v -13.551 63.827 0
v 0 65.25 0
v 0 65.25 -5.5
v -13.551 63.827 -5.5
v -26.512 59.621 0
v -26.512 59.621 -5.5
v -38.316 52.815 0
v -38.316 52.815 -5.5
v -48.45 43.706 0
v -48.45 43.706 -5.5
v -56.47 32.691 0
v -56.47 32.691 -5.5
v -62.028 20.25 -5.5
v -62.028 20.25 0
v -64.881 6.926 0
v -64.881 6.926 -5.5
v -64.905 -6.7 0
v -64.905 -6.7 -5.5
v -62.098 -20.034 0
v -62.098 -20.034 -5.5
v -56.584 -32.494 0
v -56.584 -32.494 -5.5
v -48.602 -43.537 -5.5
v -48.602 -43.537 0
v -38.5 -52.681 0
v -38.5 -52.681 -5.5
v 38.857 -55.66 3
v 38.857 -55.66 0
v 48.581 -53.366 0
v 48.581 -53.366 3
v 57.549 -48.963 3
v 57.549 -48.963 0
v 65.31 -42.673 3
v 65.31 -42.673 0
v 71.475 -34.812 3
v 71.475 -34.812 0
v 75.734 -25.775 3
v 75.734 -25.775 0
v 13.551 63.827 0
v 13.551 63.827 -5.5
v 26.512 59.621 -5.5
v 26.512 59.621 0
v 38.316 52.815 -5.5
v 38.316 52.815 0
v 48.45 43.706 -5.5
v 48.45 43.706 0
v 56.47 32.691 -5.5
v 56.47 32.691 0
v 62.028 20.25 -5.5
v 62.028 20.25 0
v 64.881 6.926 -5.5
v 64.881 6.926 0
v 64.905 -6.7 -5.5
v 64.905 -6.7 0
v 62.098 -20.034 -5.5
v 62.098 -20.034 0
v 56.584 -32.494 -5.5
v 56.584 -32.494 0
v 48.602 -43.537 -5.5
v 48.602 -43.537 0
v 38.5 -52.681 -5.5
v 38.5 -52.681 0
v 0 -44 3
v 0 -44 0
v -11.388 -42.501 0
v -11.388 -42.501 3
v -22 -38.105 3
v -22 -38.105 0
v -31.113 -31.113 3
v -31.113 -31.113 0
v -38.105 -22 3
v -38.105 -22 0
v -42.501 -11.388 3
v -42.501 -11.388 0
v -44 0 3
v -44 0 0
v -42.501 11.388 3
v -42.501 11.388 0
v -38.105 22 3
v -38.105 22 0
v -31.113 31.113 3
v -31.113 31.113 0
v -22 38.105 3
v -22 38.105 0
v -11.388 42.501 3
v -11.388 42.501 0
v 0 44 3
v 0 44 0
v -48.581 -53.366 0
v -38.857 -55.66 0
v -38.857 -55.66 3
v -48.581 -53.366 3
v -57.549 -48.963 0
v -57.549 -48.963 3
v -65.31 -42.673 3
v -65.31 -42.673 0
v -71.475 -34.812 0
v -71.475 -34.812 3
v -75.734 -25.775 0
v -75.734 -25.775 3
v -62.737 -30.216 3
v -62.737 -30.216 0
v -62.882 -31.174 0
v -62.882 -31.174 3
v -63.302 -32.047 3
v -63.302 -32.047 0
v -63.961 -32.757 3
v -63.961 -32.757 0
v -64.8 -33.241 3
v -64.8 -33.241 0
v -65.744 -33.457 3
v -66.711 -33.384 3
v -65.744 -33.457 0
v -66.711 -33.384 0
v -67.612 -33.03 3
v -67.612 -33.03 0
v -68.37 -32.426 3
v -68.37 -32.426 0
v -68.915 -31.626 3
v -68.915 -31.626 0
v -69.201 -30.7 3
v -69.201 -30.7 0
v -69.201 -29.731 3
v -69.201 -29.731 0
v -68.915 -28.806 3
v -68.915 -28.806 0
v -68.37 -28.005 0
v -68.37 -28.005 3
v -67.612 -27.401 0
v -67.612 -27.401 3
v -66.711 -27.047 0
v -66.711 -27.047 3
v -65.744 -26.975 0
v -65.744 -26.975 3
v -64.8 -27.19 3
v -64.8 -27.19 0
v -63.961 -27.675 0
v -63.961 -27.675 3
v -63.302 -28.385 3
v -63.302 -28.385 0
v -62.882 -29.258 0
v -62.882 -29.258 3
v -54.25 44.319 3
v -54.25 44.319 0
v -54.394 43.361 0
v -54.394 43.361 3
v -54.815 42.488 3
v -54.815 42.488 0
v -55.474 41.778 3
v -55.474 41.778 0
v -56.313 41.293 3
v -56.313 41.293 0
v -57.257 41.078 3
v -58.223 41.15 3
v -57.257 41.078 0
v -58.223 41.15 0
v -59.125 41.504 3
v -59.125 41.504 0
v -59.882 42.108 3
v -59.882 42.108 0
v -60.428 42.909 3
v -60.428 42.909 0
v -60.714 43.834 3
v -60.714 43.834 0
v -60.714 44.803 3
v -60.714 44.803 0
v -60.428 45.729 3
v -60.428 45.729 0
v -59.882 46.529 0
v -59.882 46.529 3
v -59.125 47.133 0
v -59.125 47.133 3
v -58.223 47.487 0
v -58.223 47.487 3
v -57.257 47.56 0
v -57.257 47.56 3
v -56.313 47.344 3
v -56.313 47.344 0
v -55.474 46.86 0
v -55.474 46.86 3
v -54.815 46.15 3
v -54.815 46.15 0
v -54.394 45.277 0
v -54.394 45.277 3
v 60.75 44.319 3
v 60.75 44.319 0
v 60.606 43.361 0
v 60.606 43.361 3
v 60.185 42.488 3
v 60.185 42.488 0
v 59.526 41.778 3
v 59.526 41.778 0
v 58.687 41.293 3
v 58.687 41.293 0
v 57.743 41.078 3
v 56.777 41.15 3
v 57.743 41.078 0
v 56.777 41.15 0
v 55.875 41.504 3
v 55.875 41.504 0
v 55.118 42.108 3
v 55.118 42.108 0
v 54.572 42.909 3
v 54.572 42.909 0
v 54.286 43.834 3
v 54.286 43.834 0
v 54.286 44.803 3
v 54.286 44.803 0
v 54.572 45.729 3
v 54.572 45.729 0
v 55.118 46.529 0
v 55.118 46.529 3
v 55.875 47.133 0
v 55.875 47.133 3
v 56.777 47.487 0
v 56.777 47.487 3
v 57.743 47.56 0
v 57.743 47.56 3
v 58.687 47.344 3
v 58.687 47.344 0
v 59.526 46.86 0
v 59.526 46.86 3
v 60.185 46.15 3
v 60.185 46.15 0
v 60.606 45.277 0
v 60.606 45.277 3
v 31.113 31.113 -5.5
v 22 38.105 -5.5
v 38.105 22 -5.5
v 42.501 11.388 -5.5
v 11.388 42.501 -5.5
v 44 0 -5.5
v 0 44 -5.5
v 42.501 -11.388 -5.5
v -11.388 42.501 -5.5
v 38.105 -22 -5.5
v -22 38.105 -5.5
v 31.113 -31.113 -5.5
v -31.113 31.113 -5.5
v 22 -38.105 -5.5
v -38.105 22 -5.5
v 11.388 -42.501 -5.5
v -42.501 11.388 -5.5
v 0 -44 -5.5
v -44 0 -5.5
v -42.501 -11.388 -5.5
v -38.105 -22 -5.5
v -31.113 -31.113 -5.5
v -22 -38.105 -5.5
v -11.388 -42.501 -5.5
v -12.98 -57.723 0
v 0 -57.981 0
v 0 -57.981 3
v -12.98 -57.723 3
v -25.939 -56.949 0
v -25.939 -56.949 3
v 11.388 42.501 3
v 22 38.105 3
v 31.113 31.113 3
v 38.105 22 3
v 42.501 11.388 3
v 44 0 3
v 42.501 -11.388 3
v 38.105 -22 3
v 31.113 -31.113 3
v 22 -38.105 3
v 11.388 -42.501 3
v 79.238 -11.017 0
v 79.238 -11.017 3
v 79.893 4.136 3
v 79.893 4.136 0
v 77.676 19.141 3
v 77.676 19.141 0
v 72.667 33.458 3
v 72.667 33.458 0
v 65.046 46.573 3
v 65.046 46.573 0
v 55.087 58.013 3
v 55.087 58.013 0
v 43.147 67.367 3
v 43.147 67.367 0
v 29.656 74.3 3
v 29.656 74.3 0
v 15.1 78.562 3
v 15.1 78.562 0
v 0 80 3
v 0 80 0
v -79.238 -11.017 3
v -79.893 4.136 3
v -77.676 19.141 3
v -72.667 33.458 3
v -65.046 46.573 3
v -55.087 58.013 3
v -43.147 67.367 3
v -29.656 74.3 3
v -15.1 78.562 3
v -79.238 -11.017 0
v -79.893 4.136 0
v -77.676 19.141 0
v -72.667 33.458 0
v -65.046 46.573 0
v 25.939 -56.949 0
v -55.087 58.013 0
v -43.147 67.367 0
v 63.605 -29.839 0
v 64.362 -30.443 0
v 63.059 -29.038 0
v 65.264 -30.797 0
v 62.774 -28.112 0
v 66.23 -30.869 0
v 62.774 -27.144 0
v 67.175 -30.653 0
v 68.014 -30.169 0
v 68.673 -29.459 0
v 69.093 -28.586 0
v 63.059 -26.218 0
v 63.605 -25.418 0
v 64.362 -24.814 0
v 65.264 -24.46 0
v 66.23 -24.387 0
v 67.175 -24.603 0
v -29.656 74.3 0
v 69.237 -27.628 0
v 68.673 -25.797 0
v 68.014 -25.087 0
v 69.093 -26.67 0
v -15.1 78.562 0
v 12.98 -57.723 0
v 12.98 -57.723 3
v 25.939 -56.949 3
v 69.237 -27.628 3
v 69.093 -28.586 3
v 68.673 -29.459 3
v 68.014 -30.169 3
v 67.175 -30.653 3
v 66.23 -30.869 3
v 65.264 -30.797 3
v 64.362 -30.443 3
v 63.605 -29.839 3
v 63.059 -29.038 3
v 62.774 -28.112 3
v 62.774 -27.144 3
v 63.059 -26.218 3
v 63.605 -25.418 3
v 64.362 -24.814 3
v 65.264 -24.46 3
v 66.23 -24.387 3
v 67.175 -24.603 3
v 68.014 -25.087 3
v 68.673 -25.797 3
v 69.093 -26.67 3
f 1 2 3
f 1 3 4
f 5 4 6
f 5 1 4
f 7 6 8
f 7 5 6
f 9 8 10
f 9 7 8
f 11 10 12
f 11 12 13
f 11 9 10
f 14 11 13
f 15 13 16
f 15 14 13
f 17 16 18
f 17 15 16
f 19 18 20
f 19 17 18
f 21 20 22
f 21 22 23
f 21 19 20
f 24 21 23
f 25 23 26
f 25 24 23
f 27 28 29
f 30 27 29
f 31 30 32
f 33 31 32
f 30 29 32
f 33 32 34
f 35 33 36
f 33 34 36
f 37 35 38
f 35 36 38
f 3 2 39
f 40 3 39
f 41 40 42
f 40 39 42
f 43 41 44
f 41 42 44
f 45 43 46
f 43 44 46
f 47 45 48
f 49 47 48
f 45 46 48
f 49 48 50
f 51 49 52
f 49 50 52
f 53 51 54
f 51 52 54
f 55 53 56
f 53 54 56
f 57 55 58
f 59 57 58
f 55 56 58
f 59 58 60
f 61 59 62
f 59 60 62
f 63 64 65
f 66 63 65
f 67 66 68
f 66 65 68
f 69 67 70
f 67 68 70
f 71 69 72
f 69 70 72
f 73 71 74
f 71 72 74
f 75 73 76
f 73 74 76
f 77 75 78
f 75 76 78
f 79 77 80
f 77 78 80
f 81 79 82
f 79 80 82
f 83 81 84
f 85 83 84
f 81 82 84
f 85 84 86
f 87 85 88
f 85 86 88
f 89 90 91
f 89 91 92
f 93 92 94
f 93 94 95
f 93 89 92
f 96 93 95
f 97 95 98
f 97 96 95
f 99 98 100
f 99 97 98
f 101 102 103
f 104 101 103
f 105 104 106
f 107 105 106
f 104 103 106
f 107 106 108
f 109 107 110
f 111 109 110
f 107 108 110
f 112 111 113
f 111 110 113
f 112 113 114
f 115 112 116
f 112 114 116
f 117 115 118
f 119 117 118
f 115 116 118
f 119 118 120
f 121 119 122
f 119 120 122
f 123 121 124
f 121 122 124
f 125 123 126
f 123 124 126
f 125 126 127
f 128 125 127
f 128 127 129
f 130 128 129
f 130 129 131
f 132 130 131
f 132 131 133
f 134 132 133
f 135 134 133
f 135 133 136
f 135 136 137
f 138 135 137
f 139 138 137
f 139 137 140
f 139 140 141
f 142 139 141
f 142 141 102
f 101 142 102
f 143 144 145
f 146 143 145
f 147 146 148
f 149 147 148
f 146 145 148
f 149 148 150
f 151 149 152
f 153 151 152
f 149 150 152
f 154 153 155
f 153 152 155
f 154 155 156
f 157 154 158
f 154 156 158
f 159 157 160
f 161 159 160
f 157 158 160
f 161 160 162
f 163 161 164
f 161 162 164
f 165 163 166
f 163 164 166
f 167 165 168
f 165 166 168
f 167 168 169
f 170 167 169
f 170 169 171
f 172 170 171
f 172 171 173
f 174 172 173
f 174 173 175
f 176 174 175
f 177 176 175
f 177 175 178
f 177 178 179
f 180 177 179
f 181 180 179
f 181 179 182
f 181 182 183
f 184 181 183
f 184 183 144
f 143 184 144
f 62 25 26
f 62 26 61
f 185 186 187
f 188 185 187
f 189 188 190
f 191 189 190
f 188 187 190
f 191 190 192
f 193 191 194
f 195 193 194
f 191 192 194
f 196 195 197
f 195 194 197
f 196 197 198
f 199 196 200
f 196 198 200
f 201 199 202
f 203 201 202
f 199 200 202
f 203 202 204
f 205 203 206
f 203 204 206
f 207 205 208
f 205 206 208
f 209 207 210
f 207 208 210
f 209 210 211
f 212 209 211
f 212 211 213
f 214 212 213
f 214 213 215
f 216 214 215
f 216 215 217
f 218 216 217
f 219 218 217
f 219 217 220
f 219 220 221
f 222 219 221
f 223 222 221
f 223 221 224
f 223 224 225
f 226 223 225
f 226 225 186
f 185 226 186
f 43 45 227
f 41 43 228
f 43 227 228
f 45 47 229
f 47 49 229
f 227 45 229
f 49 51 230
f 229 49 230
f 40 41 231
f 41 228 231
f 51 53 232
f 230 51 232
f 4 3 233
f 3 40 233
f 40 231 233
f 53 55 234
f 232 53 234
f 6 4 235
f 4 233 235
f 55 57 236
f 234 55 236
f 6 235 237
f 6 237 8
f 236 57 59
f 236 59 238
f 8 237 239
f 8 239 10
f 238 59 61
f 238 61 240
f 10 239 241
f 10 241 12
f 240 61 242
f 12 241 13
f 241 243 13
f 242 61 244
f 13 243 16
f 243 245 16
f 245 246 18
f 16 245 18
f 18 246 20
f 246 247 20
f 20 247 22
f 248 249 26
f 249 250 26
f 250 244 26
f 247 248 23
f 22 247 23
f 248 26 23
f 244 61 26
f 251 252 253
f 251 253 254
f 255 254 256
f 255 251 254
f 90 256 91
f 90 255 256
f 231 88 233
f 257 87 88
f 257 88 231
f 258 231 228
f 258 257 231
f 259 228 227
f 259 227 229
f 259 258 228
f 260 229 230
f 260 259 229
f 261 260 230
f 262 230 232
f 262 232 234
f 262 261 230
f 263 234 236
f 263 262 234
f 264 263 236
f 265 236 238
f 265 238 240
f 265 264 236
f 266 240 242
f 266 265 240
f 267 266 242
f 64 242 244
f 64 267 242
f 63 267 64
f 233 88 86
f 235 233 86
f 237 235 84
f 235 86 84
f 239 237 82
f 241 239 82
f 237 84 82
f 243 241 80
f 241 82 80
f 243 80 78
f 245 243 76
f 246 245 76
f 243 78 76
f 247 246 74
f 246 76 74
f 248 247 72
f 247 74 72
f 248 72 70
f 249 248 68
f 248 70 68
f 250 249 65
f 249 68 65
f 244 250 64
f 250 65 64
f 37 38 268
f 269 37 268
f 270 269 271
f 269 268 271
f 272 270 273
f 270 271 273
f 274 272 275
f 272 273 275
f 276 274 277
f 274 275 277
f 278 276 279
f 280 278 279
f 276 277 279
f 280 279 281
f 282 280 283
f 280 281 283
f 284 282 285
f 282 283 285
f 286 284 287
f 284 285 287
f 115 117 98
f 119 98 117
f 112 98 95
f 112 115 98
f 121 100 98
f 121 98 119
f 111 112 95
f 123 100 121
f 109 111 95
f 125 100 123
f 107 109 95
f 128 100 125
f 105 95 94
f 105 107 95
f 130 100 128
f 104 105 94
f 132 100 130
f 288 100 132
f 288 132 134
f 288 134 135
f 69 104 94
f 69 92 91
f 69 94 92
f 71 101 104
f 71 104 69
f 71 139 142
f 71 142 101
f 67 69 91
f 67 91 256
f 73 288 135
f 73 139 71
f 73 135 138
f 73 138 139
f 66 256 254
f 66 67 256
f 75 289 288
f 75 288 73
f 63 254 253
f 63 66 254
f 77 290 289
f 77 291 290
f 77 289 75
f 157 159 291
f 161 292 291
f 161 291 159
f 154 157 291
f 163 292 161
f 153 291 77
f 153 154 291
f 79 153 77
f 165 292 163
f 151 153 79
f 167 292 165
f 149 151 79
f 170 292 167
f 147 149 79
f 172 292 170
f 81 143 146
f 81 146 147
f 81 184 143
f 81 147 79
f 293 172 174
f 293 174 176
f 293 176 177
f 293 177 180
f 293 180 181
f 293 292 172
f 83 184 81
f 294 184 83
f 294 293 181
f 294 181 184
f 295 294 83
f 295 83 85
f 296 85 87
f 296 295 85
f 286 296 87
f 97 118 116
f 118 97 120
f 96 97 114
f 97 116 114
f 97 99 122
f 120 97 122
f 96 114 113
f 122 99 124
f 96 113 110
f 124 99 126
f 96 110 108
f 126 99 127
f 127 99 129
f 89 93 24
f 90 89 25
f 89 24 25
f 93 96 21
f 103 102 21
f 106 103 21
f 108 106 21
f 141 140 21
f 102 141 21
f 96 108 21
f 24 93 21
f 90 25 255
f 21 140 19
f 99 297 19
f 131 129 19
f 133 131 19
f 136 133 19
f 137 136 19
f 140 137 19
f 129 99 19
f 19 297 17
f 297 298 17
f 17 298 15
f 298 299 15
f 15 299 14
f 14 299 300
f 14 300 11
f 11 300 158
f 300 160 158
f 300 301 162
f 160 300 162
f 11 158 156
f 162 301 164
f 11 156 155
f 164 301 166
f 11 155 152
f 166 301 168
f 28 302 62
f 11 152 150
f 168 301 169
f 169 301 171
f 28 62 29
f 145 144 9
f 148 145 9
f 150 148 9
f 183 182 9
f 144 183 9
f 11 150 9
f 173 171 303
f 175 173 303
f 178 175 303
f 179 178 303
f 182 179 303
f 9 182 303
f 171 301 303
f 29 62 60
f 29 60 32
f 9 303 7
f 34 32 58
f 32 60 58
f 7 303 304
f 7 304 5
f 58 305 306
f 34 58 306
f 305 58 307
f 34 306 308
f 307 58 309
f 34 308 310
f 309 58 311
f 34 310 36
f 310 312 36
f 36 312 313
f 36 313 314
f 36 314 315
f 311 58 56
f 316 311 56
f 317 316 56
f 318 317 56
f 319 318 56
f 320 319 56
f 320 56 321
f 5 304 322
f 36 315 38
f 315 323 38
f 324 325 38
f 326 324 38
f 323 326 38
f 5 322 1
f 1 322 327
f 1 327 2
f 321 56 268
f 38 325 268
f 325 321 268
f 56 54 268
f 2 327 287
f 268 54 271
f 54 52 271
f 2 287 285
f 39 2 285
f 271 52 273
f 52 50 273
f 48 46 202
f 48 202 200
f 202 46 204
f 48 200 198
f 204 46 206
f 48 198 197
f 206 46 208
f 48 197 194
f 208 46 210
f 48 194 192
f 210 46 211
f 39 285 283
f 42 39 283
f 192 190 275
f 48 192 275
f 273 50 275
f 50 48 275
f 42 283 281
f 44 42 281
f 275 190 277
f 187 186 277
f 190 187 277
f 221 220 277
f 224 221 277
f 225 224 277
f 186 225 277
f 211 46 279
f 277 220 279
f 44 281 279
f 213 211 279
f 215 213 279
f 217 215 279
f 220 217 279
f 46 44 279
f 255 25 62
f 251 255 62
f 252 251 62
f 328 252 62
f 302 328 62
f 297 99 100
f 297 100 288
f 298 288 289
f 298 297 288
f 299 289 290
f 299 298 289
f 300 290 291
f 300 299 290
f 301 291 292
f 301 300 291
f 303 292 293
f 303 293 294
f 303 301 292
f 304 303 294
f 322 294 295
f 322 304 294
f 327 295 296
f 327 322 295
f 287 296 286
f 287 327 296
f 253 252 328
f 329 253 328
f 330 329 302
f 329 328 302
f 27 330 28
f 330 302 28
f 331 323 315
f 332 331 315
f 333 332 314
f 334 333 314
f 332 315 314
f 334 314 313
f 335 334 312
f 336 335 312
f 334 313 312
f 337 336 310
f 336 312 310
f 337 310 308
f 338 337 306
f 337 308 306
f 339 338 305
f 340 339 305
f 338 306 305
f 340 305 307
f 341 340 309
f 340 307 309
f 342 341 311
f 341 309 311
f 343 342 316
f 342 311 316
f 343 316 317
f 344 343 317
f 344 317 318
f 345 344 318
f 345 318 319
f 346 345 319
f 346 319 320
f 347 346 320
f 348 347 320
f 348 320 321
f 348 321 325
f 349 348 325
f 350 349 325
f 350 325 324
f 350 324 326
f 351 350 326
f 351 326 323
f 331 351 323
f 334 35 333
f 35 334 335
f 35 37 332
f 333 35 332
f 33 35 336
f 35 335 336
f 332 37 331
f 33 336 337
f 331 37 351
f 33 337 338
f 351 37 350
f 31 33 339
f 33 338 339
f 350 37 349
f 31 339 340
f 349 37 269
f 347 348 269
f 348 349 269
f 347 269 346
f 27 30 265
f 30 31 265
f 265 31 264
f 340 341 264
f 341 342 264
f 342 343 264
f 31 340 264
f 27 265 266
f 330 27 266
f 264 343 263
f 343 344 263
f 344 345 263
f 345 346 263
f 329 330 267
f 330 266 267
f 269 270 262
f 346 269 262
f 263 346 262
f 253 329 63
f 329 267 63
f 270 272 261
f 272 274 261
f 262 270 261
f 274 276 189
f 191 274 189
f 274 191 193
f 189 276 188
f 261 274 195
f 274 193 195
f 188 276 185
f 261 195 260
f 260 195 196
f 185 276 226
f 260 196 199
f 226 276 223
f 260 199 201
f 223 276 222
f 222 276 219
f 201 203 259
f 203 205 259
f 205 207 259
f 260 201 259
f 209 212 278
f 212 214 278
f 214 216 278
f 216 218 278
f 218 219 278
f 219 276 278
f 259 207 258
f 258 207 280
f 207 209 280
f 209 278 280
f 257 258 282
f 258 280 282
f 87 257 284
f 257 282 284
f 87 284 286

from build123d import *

# Parameters (mm, degrees)
PAD_DEPTH    = 3
PAD001_DEPTH = 5.5
SKETCH002_R  = 3.25
POCKET_DEPTH = 5


with BuildPart() as part:
    # Sketch → Pad (new body)
    with BuildSketch(Plane.XY):
        with BuildLine():
            ThreePointArc((0, -44), (44, 0), (0, 44))
            Line((0, 80), (0, 44))
            ThreePointArc((75.734063, -25.775021), (65.046144, 46.572515), (0, 80))
            ThreePointArc((38.857167, -55.659898), (61.606206, -46.036578), (75.734063, -25.775021))
            ThreePointArc((0, -57.981235), (19.463222, -57.400384), (38.857167, -55.659898))
            Line((0, -57.981235), (0, -44))
        make_face()
    pad = extrude(amount=PAD_DEPTH)

    # Sketch001 (on Face7 of Pad) → Pad001 (join)
    with BuildSketch(Plane(origin=(0, 0, 0), x_dir=(1, 0, 0), z_dir=(0, 0, -1))):
        with BuildLine():
            ThreePointArc((0, -65.25), (62.028272, -20.249839), (38.5, 52.681235))
            Line((38.5, 52.681235), (0, 52.681235))
            Line((0, 44), (0, 52.681235))
            ThreePointArc((0, -44), (44, 0), (0, 44))
            Line((0, -44), (0, -65.25))
        make_face()
    pad001 = extrude(amount=PAD001_DEPTH)

    # Mirrored: Pad, Pad001 across Sketch V_Axis
    add(pad.mirror(Plane(origin=(0, 0, 0), x_dir=(0, 0, 1), z_dir=(1, 0, 0))))
    add(pad001.mirror(Plane(origin=(0, 0, 0), x_dir=(0, 0, 1), z_dir=(1, 0, 0))))

    # Sketch002 (on Face4 of Mirrored) → Pocket (cut)
    with BuildSketch(Plane(origin=(0, 0, 0), x_dir=(1, 0, 0), z_dir=(0, 0, -1))):
        with Locations((65.987317, 27.62811)):
            Circle(SKETCH002_R)
        with Locations((57.5, -44.318765)):
            Circle(SKETCH002_R)
        with Locations((-57.5, -44.318765)):
            Circle(SKETCH002_R)
        with Locations((-65.987317, 30.215763)):
            Circle(SKETCH002_R)
    extrude(amount=-POCKET_DEPTH, mode=Mode.SUBTRACT)


solid = part.part
